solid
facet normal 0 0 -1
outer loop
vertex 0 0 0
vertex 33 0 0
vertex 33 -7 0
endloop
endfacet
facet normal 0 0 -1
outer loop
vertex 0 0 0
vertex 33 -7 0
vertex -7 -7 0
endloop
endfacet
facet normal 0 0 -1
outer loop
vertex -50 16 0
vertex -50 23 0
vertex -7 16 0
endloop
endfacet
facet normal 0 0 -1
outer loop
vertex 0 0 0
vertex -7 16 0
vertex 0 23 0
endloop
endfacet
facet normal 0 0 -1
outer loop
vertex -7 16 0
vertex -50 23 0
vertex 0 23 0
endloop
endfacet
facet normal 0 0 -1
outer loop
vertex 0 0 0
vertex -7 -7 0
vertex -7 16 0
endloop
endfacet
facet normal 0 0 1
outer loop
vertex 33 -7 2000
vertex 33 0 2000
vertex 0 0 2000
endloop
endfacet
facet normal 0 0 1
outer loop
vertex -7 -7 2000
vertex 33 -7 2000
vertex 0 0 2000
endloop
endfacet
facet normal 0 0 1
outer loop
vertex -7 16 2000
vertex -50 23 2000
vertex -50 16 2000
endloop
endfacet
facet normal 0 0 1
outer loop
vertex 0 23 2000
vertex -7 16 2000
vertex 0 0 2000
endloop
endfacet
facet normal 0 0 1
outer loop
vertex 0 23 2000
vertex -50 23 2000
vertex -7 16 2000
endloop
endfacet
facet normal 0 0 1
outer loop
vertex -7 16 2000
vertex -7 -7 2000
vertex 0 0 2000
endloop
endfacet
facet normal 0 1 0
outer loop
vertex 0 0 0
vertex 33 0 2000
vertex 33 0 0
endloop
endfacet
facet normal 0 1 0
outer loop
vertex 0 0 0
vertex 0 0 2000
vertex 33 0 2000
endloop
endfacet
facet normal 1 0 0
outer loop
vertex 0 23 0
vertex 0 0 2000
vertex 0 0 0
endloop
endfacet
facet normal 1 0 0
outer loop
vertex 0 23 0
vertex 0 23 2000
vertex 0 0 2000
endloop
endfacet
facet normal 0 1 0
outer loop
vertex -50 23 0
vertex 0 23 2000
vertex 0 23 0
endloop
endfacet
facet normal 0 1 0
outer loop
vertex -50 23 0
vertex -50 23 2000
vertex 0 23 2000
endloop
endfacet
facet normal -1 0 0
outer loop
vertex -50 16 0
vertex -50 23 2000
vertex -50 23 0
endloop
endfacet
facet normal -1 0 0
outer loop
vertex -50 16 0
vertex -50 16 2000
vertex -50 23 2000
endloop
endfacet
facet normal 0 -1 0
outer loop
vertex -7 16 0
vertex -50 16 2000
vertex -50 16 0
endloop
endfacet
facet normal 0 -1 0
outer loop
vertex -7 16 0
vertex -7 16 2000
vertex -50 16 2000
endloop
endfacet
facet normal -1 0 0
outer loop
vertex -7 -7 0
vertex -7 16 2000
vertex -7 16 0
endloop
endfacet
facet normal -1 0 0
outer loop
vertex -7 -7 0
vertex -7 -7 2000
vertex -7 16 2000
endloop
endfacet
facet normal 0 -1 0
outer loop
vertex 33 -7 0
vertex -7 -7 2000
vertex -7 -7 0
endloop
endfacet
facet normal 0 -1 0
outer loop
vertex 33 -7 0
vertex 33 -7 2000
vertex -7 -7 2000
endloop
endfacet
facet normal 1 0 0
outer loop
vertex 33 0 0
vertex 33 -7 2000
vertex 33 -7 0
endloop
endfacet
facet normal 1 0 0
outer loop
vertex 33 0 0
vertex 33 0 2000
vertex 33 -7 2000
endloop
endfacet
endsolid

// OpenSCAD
/*
Z profile

  a
___
    |
    | b
    |____
       c
 material thickness = d
 */
module simple_profile_Z(a,b,c,d, length) {
    linear_extrude( height = length ) {
        translate([-a,-d,0])
        polygon(
            points = [
                [0,b-d],
                [a-d, b-d],
                [a-d, 0],
                [a-d+c, 0],
                [a-d+c, d],
                [a,d],
                [a,b],
                [0,b]
            ],
            paths = [
                [0,1,2,3,4,5,6,7],
            ]
        );
    }
}

simple_profile_Z(50,30,40,7, 2000);
